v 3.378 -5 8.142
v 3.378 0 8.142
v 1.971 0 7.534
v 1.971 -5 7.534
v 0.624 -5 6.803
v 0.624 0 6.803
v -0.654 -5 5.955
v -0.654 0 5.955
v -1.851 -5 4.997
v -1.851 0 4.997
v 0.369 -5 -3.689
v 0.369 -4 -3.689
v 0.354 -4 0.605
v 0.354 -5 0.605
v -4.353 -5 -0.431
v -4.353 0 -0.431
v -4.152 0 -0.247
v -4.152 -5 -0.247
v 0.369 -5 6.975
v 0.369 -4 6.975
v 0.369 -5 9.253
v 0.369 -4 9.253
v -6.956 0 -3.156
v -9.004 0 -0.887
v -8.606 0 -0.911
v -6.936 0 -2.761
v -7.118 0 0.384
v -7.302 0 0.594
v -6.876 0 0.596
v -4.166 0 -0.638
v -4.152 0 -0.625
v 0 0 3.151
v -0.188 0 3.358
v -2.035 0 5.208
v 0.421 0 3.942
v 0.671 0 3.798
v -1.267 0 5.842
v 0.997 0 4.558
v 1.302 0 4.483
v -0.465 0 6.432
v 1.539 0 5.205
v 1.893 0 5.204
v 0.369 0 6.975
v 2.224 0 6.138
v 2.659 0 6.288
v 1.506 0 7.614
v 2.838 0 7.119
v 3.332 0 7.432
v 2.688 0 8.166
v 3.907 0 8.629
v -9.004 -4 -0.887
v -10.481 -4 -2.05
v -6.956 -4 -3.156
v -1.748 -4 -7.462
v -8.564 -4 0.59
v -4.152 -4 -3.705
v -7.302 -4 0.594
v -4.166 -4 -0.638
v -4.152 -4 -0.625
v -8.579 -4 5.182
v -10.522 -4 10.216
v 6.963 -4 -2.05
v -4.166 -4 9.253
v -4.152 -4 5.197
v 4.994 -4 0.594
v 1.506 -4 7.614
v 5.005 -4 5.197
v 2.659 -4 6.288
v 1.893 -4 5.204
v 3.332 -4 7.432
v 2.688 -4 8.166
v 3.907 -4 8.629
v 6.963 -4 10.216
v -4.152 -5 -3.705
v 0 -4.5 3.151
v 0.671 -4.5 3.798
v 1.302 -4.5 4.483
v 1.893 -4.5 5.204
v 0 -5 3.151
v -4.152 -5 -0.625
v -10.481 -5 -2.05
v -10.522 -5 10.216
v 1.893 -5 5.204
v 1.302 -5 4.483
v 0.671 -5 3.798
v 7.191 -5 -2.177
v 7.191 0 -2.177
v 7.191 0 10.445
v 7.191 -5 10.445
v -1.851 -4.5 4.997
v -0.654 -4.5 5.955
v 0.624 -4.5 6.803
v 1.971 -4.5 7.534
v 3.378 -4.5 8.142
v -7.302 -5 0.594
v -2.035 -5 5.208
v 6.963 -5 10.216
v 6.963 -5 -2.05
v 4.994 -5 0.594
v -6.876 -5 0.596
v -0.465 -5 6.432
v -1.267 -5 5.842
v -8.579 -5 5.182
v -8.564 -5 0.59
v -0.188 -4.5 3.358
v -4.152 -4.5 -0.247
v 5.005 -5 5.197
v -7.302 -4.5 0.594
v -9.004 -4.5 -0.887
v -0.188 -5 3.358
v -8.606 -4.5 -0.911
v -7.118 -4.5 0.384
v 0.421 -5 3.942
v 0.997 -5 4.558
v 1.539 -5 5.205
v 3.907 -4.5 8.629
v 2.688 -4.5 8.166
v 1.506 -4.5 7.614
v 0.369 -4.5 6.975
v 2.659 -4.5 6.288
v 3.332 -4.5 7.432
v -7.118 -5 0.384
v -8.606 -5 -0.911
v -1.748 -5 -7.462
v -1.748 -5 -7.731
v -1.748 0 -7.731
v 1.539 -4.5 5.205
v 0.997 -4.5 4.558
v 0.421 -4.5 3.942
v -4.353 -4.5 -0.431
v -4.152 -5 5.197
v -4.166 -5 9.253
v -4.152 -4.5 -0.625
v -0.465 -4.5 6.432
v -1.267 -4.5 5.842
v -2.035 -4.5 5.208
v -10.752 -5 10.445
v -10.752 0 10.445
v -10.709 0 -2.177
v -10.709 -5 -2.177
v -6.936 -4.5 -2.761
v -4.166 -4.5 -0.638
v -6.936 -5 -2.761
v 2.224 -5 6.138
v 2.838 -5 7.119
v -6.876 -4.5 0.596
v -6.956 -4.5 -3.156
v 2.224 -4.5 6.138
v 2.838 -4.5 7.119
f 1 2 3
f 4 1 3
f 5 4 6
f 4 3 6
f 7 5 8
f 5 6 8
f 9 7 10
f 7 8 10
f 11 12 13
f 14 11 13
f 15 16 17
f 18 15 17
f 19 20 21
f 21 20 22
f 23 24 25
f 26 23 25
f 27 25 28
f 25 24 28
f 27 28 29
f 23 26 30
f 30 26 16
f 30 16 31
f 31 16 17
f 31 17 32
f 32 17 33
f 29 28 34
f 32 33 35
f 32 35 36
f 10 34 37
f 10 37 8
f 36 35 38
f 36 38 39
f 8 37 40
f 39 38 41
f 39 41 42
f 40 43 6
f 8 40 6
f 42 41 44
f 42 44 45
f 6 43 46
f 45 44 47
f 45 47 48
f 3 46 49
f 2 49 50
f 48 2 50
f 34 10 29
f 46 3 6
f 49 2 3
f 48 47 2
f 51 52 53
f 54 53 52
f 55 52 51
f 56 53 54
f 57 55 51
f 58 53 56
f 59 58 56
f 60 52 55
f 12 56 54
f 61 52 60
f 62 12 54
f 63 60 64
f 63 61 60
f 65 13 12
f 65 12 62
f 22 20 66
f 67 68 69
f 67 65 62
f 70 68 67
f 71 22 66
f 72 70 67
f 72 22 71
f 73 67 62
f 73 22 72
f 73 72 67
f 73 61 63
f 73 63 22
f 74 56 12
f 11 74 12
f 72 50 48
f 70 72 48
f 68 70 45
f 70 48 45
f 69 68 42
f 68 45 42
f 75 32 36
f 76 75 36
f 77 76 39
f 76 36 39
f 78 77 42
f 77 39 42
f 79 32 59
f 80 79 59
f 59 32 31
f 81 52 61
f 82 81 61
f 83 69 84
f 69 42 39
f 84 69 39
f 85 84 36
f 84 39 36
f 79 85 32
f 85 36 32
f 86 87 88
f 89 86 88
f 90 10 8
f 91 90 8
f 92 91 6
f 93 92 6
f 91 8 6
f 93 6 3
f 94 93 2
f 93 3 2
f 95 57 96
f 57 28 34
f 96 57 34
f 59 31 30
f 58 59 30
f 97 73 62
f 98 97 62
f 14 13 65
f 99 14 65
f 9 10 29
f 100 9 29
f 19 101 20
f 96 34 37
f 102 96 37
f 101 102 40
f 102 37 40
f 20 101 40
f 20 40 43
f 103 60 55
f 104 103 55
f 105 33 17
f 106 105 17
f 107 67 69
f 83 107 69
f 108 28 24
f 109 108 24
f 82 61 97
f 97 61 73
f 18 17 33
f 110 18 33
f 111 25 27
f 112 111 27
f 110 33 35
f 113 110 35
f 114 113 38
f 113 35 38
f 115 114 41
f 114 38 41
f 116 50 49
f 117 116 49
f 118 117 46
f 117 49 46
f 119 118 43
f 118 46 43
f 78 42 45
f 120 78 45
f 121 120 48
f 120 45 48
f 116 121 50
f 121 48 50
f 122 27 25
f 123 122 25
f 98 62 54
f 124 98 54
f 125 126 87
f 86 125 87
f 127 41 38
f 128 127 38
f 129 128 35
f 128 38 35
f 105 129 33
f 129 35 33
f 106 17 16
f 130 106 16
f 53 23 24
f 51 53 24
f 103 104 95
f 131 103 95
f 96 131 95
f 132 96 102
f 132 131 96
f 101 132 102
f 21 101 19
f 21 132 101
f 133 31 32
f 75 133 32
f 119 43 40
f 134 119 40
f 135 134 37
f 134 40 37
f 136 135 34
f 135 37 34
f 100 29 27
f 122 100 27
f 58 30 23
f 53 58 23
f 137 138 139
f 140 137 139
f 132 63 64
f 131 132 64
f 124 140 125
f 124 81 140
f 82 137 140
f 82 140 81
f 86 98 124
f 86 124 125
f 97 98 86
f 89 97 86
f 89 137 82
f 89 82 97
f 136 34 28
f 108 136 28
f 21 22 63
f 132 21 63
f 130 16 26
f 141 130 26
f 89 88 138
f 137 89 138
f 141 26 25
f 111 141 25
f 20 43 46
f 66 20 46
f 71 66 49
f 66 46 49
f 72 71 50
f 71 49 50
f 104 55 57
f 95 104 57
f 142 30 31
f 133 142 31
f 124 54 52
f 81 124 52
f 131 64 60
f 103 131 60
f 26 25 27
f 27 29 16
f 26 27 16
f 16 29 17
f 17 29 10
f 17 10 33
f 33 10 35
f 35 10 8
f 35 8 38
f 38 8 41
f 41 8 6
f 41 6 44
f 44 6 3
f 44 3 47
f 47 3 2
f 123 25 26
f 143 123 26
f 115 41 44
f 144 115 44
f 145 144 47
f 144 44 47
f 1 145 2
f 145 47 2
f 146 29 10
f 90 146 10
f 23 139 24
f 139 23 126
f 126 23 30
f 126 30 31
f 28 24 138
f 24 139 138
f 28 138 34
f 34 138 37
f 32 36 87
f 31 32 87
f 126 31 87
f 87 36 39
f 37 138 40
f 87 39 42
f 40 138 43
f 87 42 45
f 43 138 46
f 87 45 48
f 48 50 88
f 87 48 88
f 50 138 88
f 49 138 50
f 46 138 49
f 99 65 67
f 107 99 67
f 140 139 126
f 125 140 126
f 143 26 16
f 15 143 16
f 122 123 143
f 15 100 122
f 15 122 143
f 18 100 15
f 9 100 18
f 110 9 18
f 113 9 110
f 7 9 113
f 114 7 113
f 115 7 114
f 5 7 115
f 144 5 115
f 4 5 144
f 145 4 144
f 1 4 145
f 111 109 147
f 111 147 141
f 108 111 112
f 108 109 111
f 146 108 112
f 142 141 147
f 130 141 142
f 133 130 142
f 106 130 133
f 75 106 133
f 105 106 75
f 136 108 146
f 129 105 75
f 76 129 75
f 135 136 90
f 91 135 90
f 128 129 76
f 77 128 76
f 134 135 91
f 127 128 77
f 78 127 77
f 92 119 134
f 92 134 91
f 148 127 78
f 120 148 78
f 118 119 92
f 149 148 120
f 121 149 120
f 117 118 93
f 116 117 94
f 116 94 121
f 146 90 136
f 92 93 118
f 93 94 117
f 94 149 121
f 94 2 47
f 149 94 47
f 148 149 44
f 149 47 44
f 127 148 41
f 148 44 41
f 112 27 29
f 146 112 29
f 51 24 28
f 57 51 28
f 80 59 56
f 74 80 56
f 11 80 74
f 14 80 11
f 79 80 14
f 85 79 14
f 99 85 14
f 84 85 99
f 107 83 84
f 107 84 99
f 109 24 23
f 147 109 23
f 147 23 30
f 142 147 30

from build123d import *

# Parameters (mm, degrees)
F1_DEPTH = 5
F2_DEPTH = 4
F3_DEPTH = 5
F4_DEPTH = 5
F5_DEPTH = 4.5


with BuildPart() as f1:
    # F0 (on Front) → F1 (new body)
    with BuildSketch(Plane.XZ):
        Polygon((7.1913353167, 10.4446159676), (-10.7517978176, 10.4446159676), (-10.708829388, -2.177285729), (-1.7476085341, -7.7307592146), (7.1913353167, -2.177285729), align=None)
        Polygon((-10.4806626656, -2.0497477769), (-10.522418705, 10.2160163954), (6.9627357446, 10.2160163954), (6.9627357446, -2.0501829333), (-1.7477585324, -7.4617281697), align=None, mode=Mode.SUBTRACT)
    extrude(amount=F1_DEPTH)

    # F0 (on Front) → F2 (join)
    with BuildSketch(Plane.XZ):
        Polygon((6.9627357446, 10.2160163954), (-10.522418705, 10.2160163954), (-10.4806626656, -2.0497477769), (-1.7477585324, -7.4617281697), (6.9627357446, -2.0501829333), align=None)
        with BuildLine():
            Line((-4.15201168, 5.1967860028), (-4.1658212431, 9.2533212155))
            Line((-4.1658212431, 9.2533212155), (0.368804739, 9.2533212155))
            Line((0.368804739, 9.2533212155), (0.368804739, 6.9750594877))
            ThreePointArc((0.368804739, 6.9750594877), (2.0916244454, 7.900781968), (3.9068567567, 8.6287939921))
            ThreePointArc((3.9068567567, 8.6287939921), (3.007254254, 6.8532161956), (1.892815194, 5.2039779605))
            Line((1.892815194, 5.2039779605), (5.0046861868, 5.1967860028))
            Line((5.0046861868, 5.1967860028), (4.994048737, 0.5940932573))
            Line((4.994048737, 0.5940932573), (0.3541867875, 0.6048166102))
            Line((0.3541867875, 0.6048166102), (0.368804739, -3.6891812938))
            Line((0.368804739, -3.6891812938), (-4.15201168, -3.704571398))
            Line((-4.15201168, -3.704571398), (-4.15201168, -0.6250300701))
            Line((-4.15201168, -0.6250300701), (-4.1658212431, -0.6375892587))
            Line((-4.1658212431, -0.6375892587), (-6.9562275894, -3.1560920179))
            Line((-6.9562275894, -3.1560920179), (-9.0041542426, -0.8870663005))
            Line((-9.0041542426, -0.8870663005), (-7.3019780045, 0.5940932573))
            Line((-7.3019780045, 0.5940932573), (-8.5635768523, 0.5897984274))
            Line((-8.5635768523, 0.5897984274), (-8.5792089996, 5.1817146038))
            Line((-8.5792089996, 5.1817146038), (-4.15201168, 5.1967860028))
        make_face(mode=Mode.SUBTRACT)
    extrude(amount=F2_DEPTH)

    # F0 (on Front) → F3 (join)
    with BuildSketch(Plane.XZ):
        with BuildLine():
            Line((0.368804739, 9.2533212155), (-4.1658212431, 9.2533212155))
            Line((-4.1658212431, 9.2533212155), (-4.15201168, 5.1967860028))
            Line((-4.15201168, 5.1967860028), (-8.5792089996, 5.1817146038))
            Line((-8.5792089996, 5.1817146038), (-8.5635768523, 0.5897984274))
            Line((-8.5635768523, 0.5897984274), (-7.3019780045, 0.5940932573))
            Line((-7.3019780045, 0.5940932573), (-2.0346799865, 5.2075001563))
            ThreePointArc((-2.0346799865, 5.2075001563), (-0.8706158878, 6.1425138205), (0.368804739, 6.9750594877))
            Line((0.368804739, 6.9750594877), (0.368804739, 9.2533212155))
        make_face()
        with BuildLine():
            Line((5.0046861868, 5.1967860028), (1.892815194, 5.2039779605))
            ThreePointArc((1.892815194, 5.2039779605), (0.991571407, 4.1358685051), (0, 3.1510414556))
            Line((0, 3.1510414556), (-4.15201168, -0.6250300701))
            Line((-4.15201168, -0.6250300701), (-4.15201168, -3.704571398))
            Line((-4.15201168, -3.704571398), (0.368804739, -3.6891812938))
            Line((0.368804739, -3.6891812938), (0.3541867875, 0.6048166102))
            Line((0.3541867875, 0.6048166102), (4.994048737, 0.5940932573))
            Line((4.994048737, 0.5940932573), (5.0046861868, 5.1967860028))
        make_face()
    extrude(amount=F3_DEPTH)


with BuildPart() as f4:
    # F0 (on Front) → F4 (new body)
    with BuildSketch(Plane.XZ):
        Polygon((-4.15201168, 0.6048166102), (-6.8762639991, 0.5955425051), (-7.1182296611, 0.383614862), (-8.6061118716, -0.911075375), (-6.9360168449, -2.761477859), (-4.3534158373, -0.4305314102), (-4.15201168, -0.2473632108), align=None)
        with BuildLine():
            Line((0.368804739, 5.2075001563), (0.368804739, 6.6465519446))
            ThreePointArc((0.368804739, 6.6465519446), (-0.7739971756, 5.8664839757), (-1.8505915915, 4.9973195979))
            Line((-1.8505915915, 4.9973195979), (-6.8762639991, 0.5955425051))
            Line((-6.8762639991, 0.5955425051), (-4.15201168, 0.6048166102))
            Line((-4.15201168, 0.6048166102), (-4.15201168, -0.2473632108))
            Line((-4.15201168, -0.2473632108), (-0.187986135, 3.357743215))
            ThreePointArc((-0.187986135, 3.357743215), (0.71281892, 4.2462671905), (1.5387405847, 5.2047962752))
            Line((1.5387405847, 5.2047962752), (0.368804739, 5.2075001563))
        make_face()
        with BuildLine():
            ThreePointArc((3.3783849165, 8.1422982604), (1.8370757471, 7.4679048765), (0.368804739, 6.6465519446))
            Line((0.368804739, 6.6465519446), (0.368804739, 5.2075001563))
            Line((0.368804739, 5.2075001563), (1.5387405847, 5.2047962752))
            ThreePointArc((1.5387405847, 5.2047962752), (2.5403065683, 6.6223542638), (3.3783849165, 8.1422982604))
        make_face()
    extrude(amount=F4_DEPTH)


with BuildPart() as f5:
    # F0 (on Front) → F5 (new body)
    with BuildSketch(Plane.XZ):
        with BuildLine():
            Line((0.368804739, 6.6465519446), (0.368804739, 6.9750594877))
            ThreePointArc((0.368804739, 6.9750594877), (-0.8706158878, 6.1425138205), (-2.0346799865, 5.2075001563))
            Line((-2.0346799865, 5.2075001563), (-7.3019780045, 0.5940932573))
            Line((-7.3019780045, 0.5940932573), (-6.8762639991, 0.5955425051))
            Line((-6.8762639991, 0.5955425051), (-1.8505915915, 4.9973195979))
            ThreePointArc((-1.8505915915, 4.9973195979), (-0.7739971756, 5.8664839757), (0.368804739, 6.6465519446))
        make_face()
        Polygon((-6.8762639991, 0.5955425051), (-7.3019780045, 0.5940932573), (-9.0041542426, -0.8870663005), (-6.9562275894, -3.1560920179), (-4.1658212431, -0.6375892587), (-4.15201168, -0.6250300701), (-4.15201168, -0.2473632108), (-4.3534158373, -0.4305314102), (-6.9360168449, -2.761477859), (-8.6061118716, -0.911075375), (-7.1182296611, 0.383614862), align=None)
        with BuildLine():
            ThreePointArc((0, 3.1510414556), (0.991571407, 4.1358685051), (1.892815194, 5.2039779605))
            Line((1.892815194, 5.2039779605), (1.5387405847, 5.2047962752))
            ThreePointArc((1.5387405847, 5.2047962752), (0.71281892, 4.2462671905), (-0.187986135, 3.357743215))
            Line((-0.187986135, 3.357743215), (-4.15201168, -0.2473632108))
            Line((-4.15201168, -0.2473632108), (-4.15201168, -0.6250300701))
            Line((-4.15201168, -0.6250300701), (0, 3.1510414556))
        make_face()
        with BuildLine():
            ThreePointArc((3.9068567567, 8.6287939921), (2.0916244454, 7.900781968), (0.368804739, 6.9750594877))
            Line((0.368804739, 6.9750594877), (0.368804739, 6.6465519446))
            ThreePointArc((0.368804739, 6.6465519446), (1.8370757471, 7.4679048765), (3.3783849165, 8.1422982604))
            ThreePointArc((3.3783849165, 8.1422982604), (2.5403065683, 6.6223542638), (1.5387405847, 5.2047962752))
            Line((1.5387405847, 5.2047962752), (1.892815194, 5.2039779605))
            ThreePointArc((1.892815194, 5.2039779605), (3.007254254, 6.8532161956), (3.9068567567, 8.6287939921))
        make_face()
    extrude(amount=F5_DEPTH)


solid = Compound([f1.part, f4.part, f5.part])
